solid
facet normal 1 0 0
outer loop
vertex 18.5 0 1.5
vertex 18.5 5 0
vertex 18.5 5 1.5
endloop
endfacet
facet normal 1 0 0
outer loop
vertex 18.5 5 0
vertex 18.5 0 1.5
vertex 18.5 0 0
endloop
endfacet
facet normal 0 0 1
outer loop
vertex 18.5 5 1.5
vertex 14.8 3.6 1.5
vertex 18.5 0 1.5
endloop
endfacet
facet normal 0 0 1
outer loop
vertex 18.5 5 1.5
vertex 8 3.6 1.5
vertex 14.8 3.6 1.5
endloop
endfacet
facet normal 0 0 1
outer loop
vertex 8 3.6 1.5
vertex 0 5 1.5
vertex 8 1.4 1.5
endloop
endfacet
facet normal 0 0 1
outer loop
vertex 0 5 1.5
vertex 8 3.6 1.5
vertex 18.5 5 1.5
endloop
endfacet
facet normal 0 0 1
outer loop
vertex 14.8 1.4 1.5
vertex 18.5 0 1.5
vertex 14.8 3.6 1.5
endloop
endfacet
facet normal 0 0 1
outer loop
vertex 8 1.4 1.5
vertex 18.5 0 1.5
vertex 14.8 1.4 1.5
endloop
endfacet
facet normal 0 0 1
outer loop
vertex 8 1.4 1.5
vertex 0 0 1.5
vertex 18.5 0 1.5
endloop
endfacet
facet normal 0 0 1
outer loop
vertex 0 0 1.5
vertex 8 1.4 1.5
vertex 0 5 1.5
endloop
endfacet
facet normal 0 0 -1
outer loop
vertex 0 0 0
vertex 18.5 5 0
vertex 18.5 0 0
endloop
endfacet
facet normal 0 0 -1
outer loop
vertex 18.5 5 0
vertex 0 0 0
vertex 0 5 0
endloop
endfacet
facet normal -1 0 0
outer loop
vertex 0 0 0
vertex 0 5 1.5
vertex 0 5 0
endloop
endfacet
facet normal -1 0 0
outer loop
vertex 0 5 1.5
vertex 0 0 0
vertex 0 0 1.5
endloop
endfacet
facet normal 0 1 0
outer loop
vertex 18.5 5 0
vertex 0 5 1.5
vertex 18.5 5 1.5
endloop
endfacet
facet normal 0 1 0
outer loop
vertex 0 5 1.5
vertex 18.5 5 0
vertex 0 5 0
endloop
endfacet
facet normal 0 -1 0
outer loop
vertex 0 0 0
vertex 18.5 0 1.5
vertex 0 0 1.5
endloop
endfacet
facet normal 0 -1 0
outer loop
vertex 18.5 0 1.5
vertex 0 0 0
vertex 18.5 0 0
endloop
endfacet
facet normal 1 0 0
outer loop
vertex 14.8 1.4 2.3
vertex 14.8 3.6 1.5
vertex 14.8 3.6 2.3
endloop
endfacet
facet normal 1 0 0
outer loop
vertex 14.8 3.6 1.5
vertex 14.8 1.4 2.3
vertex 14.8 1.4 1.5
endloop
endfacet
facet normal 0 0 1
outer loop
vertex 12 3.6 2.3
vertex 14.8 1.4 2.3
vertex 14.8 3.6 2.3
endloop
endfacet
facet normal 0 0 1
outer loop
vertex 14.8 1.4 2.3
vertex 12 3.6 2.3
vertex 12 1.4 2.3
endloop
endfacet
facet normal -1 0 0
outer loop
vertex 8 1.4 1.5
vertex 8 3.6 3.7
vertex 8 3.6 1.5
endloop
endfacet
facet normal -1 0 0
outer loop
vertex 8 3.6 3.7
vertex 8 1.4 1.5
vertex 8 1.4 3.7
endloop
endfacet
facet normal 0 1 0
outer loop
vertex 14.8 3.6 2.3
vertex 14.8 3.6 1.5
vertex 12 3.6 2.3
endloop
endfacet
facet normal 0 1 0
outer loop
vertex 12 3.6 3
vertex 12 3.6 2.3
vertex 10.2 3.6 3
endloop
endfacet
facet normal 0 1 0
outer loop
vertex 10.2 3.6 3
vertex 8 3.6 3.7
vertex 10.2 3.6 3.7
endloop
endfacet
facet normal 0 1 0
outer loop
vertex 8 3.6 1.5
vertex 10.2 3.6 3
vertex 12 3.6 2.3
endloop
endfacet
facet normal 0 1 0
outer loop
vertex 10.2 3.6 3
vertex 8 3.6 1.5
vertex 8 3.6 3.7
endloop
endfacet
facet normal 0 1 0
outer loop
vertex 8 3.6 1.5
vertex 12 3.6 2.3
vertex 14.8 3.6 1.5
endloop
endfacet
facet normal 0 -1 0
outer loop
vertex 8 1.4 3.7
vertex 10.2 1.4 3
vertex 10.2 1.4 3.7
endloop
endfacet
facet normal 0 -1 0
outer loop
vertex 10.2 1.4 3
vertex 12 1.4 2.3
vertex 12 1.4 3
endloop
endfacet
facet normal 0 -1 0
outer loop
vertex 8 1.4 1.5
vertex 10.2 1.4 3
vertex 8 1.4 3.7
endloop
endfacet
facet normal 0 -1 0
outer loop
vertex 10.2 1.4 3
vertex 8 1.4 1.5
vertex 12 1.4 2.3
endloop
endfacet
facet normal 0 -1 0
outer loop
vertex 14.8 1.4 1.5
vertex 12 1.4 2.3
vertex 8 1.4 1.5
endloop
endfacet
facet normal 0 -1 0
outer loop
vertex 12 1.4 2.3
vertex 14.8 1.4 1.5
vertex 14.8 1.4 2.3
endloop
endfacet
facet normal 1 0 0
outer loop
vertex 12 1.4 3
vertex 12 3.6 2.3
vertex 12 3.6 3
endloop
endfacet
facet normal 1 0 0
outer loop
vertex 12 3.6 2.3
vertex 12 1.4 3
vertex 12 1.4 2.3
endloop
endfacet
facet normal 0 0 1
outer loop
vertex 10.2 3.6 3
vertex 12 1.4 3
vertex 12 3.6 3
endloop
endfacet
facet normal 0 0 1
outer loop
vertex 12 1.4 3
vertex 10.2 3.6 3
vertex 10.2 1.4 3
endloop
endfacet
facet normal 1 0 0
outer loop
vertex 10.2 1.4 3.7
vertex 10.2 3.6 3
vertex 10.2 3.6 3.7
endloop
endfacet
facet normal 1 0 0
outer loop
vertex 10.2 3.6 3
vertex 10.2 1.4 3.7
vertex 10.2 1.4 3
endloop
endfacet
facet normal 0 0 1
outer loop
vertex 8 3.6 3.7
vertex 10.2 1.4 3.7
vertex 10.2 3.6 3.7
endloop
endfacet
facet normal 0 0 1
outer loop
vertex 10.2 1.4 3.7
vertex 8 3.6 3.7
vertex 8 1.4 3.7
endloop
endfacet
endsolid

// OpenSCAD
module knob() {
    difference() {
        linear_extrude(height=6.0, center=true) 
        polygon(
            points=[
                [-5.0, 0.0], [5.0, 0.0], [5.0, 4.0], [3.0, 10.5],
                [2.0, 10.3], [1.0, 10.25], [0.0, 10.2], [-1.0, 10.25],
                [-2.0, 10.3],
                [-3.0, 10.5], [-5.0, 4.0]
                ]);

        linear_extrude(height=3.6, center=true) 
        polygon(
            points=[
                [-3.6, -1.0], [3.6, -1.0], [3.6, 3.0], [1.9, 9.5],
                [-1.9, 9.5], [-3.6, 3.0]
                ]);
    }
    translate([2.3, 4.0, 1.8]) cube([1.0, 8.0, 1.0], center=true);
    translate([2.3, 4.0, -1.8]) cube([1.0, 8.0, 1.0], center=true);
    translate([-2.3, 4.0, 1.8]) cube([1.0, 8.0, 1.0], center=true);
    translate([-2.3, 4.0, -1.8]) cube([1.0, 8.0, 1.0], center=true);
    translate([0.0, 3.3, 2.0]) 
    rotate([0.0, 90.0, 0.0]) cylinder($fn=30, h = 8.0, r = .425, center=true);
    translate([0.0, 3.3, -2.0]) 
    rotate([0.0, 90.0, 0.0]) cylinder($fn=30, h = 8.0, r = .425, center=true);
}

module notch () {
    cube([18.5, 5.0, 1.5]);
    translate([8.0, 1.4, 0.0]) cube([6.8, 2.2, 1.5 + 0.8]);
    translate([8.0, 1.4, 0.0]) cube([4.0, 2.2, 1.5 + 1.5]);
    translate([8.0, 1.4, 0.0]) cube([2.2, 2.2, 1.5 + 2.2]);

}

// knob();

notch();
